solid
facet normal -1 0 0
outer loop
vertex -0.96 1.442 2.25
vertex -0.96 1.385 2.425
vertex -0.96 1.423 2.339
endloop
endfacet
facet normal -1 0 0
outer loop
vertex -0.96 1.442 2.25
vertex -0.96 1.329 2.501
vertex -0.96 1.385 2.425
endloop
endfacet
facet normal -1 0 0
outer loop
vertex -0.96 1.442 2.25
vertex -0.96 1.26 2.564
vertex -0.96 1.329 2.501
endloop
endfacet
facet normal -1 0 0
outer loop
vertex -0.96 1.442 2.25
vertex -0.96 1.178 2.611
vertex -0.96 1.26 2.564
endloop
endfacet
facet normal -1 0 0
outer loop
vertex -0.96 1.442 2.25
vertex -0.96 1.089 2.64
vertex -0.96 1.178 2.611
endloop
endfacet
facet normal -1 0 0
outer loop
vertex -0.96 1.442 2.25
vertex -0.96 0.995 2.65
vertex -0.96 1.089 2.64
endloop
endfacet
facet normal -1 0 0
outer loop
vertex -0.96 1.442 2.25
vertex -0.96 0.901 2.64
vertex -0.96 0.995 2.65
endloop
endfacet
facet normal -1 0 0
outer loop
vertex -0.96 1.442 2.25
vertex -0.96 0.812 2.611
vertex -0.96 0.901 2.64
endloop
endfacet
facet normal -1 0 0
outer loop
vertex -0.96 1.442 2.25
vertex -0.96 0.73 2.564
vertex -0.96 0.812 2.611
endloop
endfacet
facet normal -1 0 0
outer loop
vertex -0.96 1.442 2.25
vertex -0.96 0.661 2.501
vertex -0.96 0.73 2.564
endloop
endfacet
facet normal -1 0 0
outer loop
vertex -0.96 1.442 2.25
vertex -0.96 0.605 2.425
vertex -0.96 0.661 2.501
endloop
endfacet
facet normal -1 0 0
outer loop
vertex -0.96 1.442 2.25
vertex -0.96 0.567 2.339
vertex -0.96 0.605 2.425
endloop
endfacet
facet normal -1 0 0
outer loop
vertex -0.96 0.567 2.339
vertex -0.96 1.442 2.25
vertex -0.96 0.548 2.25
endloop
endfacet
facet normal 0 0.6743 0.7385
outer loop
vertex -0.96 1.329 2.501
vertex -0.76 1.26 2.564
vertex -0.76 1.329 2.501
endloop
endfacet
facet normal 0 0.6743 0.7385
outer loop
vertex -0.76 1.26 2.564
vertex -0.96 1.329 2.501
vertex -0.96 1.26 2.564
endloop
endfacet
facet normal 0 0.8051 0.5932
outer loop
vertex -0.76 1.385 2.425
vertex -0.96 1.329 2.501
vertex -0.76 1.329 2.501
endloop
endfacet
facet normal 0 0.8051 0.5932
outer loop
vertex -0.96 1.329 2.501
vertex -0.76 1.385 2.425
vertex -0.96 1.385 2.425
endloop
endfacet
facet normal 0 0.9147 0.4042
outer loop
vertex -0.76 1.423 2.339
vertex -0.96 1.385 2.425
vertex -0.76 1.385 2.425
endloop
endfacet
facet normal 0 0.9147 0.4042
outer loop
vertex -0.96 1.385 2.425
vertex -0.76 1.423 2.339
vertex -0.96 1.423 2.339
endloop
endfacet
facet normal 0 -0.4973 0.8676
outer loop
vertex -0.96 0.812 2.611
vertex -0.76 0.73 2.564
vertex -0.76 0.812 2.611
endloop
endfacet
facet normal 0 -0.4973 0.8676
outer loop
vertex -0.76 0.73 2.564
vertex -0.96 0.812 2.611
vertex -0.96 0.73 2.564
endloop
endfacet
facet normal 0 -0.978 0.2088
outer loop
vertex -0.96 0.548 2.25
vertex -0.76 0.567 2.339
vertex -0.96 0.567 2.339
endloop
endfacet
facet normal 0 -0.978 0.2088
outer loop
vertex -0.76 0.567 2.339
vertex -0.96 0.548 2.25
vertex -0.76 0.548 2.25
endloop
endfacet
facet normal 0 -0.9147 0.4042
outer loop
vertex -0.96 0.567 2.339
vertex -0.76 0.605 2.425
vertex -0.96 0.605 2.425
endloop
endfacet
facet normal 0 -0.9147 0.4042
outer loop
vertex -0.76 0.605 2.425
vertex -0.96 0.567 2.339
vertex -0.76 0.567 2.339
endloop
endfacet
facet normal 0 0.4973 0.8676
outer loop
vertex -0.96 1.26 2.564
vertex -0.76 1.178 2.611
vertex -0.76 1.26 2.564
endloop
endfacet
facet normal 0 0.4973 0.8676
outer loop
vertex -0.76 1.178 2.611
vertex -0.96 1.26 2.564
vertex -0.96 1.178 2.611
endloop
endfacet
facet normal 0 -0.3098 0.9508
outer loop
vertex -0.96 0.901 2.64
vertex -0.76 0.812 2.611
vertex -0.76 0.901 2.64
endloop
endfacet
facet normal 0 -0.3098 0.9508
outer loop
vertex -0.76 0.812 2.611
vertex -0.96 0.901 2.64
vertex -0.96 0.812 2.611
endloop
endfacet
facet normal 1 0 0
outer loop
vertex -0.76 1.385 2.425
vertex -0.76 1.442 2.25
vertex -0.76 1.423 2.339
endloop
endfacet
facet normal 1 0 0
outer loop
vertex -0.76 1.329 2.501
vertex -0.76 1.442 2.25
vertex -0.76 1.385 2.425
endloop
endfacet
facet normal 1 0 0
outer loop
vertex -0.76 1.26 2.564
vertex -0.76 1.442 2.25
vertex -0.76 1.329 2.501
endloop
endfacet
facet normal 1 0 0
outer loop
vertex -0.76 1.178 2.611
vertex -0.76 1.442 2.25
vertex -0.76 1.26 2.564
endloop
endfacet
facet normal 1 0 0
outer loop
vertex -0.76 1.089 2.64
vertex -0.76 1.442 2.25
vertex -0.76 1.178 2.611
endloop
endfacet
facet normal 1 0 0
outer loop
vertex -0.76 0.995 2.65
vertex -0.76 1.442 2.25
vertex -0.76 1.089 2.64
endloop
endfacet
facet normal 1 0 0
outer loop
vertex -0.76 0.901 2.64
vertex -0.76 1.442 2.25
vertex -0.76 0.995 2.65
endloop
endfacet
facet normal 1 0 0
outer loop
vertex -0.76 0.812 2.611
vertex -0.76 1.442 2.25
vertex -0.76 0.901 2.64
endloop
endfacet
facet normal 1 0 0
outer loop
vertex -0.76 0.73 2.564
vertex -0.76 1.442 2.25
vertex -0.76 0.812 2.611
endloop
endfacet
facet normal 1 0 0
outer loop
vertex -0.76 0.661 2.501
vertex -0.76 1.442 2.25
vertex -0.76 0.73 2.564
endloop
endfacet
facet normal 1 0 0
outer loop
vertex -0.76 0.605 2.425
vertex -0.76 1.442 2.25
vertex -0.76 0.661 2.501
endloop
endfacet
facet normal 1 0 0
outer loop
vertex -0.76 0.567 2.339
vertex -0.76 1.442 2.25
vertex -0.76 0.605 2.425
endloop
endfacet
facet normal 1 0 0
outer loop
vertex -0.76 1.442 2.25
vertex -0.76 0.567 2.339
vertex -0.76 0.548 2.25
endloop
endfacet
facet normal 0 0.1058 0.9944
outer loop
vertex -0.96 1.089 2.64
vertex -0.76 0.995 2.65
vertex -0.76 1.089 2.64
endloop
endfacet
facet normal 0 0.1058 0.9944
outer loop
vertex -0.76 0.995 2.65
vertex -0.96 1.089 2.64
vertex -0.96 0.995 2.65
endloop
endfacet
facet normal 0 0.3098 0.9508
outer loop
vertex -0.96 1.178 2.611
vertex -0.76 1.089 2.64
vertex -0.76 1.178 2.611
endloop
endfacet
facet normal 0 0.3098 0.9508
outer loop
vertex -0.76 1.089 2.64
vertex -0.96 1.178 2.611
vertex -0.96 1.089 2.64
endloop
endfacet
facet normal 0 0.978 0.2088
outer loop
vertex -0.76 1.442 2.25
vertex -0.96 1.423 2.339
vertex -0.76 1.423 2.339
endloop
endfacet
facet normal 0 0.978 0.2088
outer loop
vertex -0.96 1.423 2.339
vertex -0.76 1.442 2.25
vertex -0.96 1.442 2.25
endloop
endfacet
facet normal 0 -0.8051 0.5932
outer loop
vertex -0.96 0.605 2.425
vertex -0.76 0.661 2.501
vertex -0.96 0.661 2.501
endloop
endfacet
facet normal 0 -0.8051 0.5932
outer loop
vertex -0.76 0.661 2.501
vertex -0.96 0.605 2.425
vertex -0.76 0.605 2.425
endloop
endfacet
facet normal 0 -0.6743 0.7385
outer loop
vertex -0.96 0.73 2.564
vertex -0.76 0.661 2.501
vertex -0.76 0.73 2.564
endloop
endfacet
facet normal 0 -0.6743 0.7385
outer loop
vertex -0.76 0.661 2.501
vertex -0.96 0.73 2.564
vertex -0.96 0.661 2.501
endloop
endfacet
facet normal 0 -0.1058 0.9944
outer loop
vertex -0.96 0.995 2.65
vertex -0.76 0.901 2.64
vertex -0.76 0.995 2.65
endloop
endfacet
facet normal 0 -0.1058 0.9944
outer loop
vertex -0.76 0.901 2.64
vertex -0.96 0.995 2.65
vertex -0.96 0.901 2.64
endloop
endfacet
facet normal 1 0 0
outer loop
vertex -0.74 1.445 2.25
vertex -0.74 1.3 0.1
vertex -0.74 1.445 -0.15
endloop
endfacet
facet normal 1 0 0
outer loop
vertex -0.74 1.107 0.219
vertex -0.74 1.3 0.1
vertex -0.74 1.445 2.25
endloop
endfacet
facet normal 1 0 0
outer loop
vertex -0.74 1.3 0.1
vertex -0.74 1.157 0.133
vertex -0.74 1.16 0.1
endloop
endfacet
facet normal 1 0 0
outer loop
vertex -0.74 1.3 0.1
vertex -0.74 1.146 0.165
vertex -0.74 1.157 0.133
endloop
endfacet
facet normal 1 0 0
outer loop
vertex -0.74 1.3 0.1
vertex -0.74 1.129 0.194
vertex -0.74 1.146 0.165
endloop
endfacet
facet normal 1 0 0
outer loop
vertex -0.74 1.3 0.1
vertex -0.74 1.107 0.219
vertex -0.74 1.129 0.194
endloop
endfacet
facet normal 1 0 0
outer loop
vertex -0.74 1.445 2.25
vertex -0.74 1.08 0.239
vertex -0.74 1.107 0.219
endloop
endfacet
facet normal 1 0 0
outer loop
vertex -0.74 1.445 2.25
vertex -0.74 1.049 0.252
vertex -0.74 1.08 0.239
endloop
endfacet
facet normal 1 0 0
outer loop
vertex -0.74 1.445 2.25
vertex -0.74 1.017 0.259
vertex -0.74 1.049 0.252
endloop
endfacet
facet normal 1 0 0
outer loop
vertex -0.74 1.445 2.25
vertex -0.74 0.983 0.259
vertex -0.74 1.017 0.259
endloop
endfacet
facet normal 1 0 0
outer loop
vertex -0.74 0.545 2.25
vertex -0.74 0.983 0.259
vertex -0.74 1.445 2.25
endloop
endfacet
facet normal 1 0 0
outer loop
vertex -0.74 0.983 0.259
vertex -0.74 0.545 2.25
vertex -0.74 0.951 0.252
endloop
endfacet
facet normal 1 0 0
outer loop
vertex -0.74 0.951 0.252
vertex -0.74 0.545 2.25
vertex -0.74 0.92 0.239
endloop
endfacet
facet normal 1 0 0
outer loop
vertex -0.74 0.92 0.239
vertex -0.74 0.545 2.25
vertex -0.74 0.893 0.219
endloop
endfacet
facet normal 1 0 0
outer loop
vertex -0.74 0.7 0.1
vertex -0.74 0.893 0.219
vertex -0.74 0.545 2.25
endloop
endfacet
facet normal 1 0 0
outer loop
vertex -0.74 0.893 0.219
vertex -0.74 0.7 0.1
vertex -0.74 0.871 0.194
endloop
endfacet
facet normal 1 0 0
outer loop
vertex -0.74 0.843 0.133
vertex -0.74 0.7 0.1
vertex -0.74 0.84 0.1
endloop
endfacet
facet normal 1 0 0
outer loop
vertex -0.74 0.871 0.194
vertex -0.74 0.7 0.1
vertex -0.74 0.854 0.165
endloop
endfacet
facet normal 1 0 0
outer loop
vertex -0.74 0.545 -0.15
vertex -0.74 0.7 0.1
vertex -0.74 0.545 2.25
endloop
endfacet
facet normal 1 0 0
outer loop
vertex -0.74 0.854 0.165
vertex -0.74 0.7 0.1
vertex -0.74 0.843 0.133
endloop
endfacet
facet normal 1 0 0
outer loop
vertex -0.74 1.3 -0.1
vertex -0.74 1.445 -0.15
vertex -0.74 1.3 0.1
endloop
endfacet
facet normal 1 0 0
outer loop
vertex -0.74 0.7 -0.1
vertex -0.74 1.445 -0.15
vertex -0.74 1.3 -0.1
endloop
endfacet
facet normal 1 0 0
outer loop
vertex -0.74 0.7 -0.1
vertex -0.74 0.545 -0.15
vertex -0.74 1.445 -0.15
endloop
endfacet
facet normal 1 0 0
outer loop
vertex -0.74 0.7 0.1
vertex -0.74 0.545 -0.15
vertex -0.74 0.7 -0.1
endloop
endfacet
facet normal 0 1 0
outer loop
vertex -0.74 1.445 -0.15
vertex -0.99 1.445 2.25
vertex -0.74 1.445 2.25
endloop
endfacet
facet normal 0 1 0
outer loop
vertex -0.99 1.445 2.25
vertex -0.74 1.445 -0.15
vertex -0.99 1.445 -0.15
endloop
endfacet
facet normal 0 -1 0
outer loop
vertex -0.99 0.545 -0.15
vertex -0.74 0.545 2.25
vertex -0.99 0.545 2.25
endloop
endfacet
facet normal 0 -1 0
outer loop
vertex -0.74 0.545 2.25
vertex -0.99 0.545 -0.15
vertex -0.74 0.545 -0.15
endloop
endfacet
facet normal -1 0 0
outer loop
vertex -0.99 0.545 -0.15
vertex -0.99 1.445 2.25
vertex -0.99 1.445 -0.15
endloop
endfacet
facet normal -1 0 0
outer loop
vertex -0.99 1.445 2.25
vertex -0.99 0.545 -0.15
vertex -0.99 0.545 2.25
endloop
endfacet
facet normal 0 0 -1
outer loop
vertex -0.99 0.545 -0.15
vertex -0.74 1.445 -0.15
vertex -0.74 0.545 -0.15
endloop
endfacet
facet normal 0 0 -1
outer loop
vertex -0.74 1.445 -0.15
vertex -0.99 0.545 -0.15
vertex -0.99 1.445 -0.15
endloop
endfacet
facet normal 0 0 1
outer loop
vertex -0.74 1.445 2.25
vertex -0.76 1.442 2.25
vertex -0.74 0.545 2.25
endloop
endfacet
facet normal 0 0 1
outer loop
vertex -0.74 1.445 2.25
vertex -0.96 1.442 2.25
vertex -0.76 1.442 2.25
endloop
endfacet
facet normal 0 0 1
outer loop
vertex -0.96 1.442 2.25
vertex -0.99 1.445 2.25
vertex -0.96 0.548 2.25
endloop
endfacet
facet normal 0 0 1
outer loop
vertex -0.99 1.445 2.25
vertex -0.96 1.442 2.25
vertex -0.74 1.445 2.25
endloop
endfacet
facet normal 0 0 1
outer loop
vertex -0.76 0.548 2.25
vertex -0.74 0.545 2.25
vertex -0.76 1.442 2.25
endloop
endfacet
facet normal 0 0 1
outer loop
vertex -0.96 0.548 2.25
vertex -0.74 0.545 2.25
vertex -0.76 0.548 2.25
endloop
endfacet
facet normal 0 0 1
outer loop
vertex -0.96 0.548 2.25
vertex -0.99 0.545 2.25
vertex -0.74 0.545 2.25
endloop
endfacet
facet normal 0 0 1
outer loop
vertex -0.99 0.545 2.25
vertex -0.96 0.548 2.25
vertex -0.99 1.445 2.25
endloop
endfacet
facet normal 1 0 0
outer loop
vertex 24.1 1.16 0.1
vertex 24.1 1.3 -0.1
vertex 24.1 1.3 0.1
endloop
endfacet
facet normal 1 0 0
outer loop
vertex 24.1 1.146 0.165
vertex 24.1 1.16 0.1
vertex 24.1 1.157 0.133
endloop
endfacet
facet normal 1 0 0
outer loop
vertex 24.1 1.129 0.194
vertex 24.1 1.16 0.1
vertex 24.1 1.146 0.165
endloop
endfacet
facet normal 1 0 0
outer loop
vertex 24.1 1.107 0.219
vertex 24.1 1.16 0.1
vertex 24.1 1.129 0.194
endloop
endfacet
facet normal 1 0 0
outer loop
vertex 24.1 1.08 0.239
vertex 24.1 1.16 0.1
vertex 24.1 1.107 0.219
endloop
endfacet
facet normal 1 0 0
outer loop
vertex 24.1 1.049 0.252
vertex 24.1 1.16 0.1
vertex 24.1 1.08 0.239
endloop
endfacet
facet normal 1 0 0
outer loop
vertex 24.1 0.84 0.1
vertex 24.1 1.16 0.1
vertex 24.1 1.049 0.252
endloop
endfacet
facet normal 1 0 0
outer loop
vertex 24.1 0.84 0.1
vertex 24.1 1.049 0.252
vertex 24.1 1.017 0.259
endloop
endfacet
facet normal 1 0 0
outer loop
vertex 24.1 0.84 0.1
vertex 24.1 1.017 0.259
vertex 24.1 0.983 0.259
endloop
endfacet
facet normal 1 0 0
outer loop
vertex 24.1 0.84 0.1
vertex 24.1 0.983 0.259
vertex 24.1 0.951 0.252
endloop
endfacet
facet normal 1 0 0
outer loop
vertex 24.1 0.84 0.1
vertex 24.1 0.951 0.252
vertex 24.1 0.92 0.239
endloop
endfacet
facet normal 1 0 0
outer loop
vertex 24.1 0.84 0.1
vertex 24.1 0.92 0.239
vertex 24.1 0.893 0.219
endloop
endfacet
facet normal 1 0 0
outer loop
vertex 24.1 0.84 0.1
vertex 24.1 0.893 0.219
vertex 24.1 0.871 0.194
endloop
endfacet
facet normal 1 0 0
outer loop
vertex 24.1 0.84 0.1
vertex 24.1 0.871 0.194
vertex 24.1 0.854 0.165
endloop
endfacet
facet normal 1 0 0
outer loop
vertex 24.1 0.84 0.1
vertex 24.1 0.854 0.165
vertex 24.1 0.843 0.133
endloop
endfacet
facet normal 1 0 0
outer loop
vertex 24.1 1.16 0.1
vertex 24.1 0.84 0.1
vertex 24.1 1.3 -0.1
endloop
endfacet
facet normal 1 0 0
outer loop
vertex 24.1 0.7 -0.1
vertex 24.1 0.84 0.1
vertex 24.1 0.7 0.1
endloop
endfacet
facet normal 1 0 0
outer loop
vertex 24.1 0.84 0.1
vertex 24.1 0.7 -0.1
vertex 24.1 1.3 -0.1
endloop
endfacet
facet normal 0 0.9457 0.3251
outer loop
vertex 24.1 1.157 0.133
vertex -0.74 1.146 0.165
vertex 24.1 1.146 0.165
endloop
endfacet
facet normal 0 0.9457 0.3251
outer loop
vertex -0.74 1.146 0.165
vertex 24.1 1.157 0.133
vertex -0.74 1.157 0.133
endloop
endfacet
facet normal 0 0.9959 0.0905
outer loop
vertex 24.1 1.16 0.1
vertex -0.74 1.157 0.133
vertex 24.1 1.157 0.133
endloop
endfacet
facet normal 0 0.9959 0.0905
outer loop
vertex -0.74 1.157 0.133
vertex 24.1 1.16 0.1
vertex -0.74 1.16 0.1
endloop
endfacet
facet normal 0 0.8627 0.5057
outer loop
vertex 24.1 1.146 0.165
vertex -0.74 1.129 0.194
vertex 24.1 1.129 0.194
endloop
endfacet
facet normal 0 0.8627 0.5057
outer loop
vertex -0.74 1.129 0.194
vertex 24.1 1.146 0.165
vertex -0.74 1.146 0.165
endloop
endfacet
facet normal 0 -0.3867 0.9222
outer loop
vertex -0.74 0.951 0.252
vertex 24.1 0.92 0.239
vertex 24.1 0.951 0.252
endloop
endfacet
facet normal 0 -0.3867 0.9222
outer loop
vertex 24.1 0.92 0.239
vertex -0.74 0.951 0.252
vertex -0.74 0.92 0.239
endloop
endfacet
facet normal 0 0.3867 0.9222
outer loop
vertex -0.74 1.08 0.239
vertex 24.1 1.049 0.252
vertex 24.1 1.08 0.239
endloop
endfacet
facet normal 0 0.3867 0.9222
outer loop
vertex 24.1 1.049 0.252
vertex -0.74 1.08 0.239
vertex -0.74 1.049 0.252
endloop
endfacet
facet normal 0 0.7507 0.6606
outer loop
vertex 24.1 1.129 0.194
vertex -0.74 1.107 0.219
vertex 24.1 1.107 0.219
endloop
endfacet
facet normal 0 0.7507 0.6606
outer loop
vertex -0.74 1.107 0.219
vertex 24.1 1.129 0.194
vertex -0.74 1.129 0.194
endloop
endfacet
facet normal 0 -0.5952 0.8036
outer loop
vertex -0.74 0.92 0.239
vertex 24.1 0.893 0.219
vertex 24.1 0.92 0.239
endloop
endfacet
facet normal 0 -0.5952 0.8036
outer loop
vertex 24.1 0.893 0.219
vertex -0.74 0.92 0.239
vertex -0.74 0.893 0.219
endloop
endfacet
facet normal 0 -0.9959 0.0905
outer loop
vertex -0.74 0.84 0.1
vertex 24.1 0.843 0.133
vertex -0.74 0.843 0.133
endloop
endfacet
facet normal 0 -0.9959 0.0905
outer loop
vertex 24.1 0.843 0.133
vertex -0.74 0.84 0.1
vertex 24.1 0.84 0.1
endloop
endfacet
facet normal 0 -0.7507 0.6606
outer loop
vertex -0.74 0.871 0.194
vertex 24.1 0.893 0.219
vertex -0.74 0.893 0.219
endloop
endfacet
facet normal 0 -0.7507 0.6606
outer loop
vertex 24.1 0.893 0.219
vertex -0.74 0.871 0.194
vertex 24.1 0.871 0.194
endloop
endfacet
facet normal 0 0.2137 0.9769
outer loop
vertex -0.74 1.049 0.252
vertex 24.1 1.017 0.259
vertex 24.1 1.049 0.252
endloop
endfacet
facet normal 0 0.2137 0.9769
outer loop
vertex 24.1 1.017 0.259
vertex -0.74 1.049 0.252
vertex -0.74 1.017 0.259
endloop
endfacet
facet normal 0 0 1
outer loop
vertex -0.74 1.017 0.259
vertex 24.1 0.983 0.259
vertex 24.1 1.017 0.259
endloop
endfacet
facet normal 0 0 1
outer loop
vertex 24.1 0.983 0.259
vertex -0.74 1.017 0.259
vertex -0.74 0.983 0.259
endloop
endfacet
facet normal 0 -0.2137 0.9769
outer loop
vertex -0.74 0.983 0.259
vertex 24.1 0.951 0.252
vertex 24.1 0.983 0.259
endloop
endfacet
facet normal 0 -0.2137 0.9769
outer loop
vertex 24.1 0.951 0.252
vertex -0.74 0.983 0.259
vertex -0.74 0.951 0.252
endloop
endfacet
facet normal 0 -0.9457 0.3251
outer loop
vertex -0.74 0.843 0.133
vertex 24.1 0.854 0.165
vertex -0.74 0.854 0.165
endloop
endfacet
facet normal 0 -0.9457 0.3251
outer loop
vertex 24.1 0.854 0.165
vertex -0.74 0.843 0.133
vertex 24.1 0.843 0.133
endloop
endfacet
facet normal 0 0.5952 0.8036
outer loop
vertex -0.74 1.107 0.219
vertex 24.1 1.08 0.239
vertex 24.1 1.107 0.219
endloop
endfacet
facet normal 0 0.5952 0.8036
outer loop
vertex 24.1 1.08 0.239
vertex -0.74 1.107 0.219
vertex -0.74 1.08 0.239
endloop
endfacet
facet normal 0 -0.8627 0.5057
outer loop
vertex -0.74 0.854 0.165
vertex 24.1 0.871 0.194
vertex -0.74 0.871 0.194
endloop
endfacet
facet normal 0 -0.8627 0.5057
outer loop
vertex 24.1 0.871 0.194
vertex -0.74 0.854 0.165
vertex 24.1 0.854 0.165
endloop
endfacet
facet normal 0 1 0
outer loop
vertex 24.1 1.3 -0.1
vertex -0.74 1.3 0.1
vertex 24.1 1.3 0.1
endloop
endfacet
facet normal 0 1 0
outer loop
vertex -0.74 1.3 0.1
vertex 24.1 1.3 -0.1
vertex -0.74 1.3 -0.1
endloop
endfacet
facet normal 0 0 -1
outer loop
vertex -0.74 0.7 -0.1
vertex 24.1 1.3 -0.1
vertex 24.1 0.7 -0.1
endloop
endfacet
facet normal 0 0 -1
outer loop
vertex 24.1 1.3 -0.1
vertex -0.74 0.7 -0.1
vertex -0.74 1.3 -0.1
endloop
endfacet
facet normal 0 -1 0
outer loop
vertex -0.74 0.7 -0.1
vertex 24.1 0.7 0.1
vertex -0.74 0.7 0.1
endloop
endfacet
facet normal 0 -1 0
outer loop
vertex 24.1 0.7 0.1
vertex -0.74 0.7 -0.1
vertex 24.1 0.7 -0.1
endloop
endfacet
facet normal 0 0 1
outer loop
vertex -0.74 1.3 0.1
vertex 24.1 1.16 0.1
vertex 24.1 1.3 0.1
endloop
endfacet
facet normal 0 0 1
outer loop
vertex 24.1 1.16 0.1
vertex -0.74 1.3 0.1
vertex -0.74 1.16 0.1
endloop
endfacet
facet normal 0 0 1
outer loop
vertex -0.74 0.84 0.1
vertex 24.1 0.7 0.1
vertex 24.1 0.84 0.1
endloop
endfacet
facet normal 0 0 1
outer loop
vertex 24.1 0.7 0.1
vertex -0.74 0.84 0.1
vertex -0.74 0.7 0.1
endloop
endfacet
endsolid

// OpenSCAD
//bâton à bout plat
//Flat end stick
//Une long prisme rectangulaire avec un long demi cylindre (placer verticalement)
// Long rectangular prisim with long half-cylinder (vertical)
$fn=30; 
union()	{
translate([0,0,0])				{
rotate(a=120,v=[1,1,1])translate([1,0.1,-0.9])cylinder(r=0.16,h=25);
rotate(a=270,v=[5,0,0])translate([-0.9,-0.1,0.7])cube(size=[25,0.2,0.6]);

// bout plat à la fin du bâton
// Flat end at the end of stick
rotate(a=270,v=[1,0,0]) {
translate([-0.99,-2,1.045]){
translate([0.03,-0.2,-0.05])rotate(a=120,v=[1,1,1])cylinder(r=0.45,h=0.2);
translate([0,-0.25,-0.5])cube(size=[0.25,2.4,0.9]);
					         }

				                  }
			
											}

			}
